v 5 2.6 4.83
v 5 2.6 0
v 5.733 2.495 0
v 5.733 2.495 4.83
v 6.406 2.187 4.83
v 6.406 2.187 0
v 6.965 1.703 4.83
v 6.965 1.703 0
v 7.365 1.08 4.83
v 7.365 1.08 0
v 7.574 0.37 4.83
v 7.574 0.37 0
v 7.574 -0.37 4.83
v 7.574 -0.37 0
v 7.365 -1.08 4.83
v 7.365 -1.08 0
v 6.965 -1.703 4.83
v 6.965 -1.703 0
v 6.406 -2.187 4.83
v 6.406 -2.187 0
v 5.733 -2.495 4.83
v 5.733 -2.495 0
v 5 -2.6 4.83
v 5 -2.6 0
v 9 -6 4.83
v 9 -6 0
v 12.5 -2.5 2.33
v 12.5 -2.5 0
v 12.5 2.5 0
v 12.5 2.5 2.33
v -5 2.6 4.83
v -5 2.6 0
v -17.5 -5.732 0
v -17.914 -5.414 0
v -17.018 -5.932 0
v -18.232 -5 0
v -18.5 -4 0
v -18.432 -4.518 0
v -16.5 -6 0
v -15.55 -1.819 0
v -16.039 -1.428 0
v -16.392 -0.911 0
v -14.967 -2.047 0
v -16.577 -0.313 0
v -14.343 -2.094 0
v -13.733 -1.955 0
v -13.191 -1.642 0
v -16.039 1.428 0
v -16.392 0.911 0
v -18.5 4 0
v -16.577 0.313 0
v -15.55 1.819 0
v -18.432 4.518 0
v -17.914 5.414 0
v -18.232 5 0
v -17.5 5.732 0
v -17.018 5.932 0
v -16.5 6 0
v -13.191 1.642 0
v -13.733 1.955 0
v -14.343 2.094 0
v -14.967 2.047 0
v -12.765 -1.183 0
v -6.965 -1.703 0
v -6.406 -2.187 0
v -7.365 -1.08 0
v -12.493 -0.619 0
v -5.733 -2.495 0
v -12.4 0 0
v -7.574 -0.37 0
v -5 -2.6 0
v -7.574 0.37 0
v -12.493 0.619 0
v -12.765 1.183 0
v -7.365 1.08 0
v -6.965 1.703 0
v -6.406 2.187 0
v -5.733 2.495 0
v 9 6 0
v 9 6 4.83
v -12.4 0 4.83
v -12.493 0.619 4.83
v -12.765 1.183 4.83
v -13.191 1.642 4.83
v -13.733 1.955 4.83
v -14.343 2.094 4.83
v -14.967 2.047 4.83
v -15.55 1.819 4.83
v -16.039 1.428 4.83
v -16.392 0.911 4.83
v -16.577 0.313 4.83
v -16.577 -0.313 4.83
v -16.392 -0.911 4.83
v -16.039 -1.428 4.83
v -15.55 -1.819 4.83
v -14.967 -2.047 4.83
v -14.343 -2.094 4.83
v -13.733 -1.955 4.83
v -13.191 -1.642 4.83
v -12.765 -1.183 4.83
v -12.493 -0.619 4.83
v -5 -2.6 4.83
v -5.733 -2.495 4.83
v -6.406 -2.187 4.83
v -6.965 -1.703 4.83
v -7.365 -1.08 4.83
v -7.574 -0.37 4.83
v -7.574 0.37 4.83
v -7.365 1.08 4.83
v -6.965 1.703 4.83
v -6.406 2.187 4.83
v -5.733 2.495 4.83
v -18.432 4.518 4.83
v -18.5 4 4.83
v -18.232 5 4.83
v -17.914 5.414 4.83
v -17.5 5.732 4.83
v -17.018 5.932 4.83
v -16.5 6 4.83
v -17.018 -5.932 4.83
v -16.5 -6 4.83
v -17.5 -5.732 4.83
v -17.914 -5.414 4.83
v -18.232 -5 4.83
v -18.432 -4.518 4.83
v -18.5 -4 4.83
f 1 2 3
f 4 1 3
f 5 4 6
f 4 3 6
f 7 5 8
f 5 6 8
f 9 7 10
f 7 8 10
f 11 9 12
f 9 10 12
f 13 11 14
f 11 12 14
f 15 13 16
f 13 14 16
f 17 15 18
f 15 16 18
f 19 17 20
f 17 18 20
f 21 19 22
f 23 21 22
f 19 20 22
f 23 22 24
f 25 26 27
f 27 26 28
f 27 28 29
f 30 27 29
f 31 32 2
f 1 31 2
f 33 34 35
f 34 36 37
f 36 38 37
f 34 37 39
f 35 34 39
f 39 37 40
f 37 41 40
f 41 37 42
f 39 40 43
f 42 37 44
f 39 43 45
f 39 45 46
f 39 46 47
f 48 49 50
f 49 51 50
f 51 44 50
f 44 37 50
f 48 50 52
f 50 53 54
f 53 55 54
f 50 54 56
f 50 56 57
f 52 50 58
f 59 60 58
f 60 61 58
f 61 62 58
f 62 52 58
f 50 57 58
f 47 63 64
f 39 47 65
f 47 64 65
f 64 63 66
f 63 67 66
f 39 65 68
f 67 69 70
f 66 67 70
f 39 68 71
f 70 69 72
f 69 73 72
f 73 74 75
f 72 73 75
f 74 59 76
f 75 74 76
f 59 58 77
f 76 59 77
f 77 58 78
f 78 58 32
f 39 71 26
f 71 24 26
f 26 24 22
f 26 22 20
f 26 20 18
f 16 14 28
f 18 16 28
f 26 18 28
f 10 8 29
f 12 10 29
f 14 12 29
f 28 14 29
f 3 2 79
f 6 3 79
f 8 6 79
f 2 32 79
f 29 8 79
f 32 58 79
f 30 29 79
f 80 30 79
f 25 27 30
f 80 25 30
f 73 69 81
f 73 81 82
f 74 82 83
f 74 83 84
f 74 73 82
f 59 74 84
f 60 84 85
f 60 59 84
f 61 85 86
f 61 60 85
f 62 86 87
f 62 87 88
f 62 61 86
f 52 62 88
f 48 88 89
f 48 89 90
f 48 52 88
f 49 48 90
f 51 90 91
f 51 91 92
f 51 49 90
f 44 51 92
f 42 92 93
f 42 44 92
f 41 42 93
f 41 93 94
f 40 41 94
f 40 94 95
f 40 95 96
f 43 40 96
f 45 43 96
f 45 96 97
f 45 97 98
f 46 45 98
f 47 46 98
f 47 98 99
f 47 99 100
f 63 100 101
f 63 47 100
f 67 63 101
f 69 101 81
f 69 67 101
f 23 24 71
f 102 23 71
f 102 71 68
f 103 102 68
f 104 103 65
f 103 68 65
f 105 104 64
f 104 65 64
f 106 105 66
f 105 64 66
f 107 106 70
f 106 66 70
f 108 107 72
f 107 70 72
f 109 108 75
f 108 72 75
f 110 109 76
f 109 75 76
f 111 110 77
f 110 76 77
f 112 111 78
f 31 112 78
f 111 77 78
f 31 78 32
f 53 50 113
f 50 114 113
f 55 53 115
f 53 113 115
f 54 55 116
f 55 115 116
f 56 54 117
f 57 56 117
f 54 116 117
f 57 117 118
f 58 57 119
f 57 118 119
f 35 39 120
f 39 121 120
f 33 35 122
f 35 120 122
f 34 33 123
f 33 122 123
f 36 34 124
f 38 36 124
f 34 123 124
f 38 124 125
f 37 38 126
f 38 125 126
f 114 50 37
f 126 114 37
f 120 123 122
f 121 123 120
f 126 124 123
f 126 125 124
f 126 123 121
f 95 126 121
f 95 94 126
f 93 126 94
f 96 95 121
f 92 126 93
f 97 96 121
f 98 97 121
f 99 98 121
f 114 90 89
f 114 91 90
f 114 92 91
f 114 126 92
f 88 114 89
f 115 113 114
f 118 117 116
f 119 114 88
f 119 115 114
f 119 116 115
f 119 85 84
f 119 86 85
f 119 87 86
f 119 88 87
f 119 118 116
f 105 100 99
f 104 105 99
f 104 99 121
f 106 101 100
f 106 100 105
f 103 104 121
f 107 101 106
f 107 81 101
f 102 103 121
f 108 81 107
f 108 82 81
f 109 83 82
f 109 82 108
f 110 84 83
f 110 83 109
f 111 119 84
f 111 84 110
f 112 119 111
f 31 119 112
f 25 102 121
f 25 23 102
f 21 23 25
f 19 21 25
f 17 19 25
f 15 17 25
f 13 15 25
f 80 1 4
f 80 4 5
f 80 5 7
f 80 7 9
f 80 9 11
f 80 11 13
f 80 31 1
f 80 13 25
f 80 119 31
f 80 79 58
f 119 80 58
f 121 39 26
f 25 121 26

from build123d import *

# Parameters (mm, degrees)
F0_R     = 2.1
F1_DEPTH = 4.83
F2_SIZE2 = 2.5
F2_SIZE  = 3.5
F3_R     = 2
F4_R     = 2


with BuildPart() as f1:
    # F0 (on Top) → F1 (new body)
    with BuildSketch(Plane.XY):
        Polygon((-12.5, -6), (9, -6), (12.5, -2.5), (12.5, 2.5), (9, 6), (-12.5, 6), (-18.5, 6), (-18.5, -6), align=None)
        with Locations((-14.5, 0)):
            Circle(F0_R, mode=Mode.SUBTRACT)
        with BuildLine():
            Line((5, -2.6), (-5, -2.6))
            ThreePointArc((-5, -2.6), (-7.6, 0), (-5, 2.6))
            Line((-5, 2.6), (5, 2.6))
            ThreePointArc((5, 2.6), (7.6, 0), (5, -2.6))
        make_face(mode=Mode.SUBTRACT)
    extrude(amount=F1_DEPTH)

    # F2
    f2_edges = [f1.edges().sort_by_distance(p)[0] for p in [
        (12.5, 0, 4.83),
    ]]
    f2_side = f1.faces().sort_by_distance((-4.75, -5.667585, 4.83))[0]
    chamfer(f2_edges, length=F2_SIZE, length2=F2_SIZE2, reference=f2_side)

    # F3
    f3_edges = [f1.edges().sort_by_distance(p)[0] for p in [
        (-18.5, -6, 2.415),
    ]]
    fillet(f3_edges, radius=F3_R)

    # F4
    f4_edges = [f1.edges().sort_by_distance(p)[0] for p in [
        (-18.5, 6, 2.415),
    ]]
    fillet(f4_edges, radius=F4_R)


solid = f1.part
